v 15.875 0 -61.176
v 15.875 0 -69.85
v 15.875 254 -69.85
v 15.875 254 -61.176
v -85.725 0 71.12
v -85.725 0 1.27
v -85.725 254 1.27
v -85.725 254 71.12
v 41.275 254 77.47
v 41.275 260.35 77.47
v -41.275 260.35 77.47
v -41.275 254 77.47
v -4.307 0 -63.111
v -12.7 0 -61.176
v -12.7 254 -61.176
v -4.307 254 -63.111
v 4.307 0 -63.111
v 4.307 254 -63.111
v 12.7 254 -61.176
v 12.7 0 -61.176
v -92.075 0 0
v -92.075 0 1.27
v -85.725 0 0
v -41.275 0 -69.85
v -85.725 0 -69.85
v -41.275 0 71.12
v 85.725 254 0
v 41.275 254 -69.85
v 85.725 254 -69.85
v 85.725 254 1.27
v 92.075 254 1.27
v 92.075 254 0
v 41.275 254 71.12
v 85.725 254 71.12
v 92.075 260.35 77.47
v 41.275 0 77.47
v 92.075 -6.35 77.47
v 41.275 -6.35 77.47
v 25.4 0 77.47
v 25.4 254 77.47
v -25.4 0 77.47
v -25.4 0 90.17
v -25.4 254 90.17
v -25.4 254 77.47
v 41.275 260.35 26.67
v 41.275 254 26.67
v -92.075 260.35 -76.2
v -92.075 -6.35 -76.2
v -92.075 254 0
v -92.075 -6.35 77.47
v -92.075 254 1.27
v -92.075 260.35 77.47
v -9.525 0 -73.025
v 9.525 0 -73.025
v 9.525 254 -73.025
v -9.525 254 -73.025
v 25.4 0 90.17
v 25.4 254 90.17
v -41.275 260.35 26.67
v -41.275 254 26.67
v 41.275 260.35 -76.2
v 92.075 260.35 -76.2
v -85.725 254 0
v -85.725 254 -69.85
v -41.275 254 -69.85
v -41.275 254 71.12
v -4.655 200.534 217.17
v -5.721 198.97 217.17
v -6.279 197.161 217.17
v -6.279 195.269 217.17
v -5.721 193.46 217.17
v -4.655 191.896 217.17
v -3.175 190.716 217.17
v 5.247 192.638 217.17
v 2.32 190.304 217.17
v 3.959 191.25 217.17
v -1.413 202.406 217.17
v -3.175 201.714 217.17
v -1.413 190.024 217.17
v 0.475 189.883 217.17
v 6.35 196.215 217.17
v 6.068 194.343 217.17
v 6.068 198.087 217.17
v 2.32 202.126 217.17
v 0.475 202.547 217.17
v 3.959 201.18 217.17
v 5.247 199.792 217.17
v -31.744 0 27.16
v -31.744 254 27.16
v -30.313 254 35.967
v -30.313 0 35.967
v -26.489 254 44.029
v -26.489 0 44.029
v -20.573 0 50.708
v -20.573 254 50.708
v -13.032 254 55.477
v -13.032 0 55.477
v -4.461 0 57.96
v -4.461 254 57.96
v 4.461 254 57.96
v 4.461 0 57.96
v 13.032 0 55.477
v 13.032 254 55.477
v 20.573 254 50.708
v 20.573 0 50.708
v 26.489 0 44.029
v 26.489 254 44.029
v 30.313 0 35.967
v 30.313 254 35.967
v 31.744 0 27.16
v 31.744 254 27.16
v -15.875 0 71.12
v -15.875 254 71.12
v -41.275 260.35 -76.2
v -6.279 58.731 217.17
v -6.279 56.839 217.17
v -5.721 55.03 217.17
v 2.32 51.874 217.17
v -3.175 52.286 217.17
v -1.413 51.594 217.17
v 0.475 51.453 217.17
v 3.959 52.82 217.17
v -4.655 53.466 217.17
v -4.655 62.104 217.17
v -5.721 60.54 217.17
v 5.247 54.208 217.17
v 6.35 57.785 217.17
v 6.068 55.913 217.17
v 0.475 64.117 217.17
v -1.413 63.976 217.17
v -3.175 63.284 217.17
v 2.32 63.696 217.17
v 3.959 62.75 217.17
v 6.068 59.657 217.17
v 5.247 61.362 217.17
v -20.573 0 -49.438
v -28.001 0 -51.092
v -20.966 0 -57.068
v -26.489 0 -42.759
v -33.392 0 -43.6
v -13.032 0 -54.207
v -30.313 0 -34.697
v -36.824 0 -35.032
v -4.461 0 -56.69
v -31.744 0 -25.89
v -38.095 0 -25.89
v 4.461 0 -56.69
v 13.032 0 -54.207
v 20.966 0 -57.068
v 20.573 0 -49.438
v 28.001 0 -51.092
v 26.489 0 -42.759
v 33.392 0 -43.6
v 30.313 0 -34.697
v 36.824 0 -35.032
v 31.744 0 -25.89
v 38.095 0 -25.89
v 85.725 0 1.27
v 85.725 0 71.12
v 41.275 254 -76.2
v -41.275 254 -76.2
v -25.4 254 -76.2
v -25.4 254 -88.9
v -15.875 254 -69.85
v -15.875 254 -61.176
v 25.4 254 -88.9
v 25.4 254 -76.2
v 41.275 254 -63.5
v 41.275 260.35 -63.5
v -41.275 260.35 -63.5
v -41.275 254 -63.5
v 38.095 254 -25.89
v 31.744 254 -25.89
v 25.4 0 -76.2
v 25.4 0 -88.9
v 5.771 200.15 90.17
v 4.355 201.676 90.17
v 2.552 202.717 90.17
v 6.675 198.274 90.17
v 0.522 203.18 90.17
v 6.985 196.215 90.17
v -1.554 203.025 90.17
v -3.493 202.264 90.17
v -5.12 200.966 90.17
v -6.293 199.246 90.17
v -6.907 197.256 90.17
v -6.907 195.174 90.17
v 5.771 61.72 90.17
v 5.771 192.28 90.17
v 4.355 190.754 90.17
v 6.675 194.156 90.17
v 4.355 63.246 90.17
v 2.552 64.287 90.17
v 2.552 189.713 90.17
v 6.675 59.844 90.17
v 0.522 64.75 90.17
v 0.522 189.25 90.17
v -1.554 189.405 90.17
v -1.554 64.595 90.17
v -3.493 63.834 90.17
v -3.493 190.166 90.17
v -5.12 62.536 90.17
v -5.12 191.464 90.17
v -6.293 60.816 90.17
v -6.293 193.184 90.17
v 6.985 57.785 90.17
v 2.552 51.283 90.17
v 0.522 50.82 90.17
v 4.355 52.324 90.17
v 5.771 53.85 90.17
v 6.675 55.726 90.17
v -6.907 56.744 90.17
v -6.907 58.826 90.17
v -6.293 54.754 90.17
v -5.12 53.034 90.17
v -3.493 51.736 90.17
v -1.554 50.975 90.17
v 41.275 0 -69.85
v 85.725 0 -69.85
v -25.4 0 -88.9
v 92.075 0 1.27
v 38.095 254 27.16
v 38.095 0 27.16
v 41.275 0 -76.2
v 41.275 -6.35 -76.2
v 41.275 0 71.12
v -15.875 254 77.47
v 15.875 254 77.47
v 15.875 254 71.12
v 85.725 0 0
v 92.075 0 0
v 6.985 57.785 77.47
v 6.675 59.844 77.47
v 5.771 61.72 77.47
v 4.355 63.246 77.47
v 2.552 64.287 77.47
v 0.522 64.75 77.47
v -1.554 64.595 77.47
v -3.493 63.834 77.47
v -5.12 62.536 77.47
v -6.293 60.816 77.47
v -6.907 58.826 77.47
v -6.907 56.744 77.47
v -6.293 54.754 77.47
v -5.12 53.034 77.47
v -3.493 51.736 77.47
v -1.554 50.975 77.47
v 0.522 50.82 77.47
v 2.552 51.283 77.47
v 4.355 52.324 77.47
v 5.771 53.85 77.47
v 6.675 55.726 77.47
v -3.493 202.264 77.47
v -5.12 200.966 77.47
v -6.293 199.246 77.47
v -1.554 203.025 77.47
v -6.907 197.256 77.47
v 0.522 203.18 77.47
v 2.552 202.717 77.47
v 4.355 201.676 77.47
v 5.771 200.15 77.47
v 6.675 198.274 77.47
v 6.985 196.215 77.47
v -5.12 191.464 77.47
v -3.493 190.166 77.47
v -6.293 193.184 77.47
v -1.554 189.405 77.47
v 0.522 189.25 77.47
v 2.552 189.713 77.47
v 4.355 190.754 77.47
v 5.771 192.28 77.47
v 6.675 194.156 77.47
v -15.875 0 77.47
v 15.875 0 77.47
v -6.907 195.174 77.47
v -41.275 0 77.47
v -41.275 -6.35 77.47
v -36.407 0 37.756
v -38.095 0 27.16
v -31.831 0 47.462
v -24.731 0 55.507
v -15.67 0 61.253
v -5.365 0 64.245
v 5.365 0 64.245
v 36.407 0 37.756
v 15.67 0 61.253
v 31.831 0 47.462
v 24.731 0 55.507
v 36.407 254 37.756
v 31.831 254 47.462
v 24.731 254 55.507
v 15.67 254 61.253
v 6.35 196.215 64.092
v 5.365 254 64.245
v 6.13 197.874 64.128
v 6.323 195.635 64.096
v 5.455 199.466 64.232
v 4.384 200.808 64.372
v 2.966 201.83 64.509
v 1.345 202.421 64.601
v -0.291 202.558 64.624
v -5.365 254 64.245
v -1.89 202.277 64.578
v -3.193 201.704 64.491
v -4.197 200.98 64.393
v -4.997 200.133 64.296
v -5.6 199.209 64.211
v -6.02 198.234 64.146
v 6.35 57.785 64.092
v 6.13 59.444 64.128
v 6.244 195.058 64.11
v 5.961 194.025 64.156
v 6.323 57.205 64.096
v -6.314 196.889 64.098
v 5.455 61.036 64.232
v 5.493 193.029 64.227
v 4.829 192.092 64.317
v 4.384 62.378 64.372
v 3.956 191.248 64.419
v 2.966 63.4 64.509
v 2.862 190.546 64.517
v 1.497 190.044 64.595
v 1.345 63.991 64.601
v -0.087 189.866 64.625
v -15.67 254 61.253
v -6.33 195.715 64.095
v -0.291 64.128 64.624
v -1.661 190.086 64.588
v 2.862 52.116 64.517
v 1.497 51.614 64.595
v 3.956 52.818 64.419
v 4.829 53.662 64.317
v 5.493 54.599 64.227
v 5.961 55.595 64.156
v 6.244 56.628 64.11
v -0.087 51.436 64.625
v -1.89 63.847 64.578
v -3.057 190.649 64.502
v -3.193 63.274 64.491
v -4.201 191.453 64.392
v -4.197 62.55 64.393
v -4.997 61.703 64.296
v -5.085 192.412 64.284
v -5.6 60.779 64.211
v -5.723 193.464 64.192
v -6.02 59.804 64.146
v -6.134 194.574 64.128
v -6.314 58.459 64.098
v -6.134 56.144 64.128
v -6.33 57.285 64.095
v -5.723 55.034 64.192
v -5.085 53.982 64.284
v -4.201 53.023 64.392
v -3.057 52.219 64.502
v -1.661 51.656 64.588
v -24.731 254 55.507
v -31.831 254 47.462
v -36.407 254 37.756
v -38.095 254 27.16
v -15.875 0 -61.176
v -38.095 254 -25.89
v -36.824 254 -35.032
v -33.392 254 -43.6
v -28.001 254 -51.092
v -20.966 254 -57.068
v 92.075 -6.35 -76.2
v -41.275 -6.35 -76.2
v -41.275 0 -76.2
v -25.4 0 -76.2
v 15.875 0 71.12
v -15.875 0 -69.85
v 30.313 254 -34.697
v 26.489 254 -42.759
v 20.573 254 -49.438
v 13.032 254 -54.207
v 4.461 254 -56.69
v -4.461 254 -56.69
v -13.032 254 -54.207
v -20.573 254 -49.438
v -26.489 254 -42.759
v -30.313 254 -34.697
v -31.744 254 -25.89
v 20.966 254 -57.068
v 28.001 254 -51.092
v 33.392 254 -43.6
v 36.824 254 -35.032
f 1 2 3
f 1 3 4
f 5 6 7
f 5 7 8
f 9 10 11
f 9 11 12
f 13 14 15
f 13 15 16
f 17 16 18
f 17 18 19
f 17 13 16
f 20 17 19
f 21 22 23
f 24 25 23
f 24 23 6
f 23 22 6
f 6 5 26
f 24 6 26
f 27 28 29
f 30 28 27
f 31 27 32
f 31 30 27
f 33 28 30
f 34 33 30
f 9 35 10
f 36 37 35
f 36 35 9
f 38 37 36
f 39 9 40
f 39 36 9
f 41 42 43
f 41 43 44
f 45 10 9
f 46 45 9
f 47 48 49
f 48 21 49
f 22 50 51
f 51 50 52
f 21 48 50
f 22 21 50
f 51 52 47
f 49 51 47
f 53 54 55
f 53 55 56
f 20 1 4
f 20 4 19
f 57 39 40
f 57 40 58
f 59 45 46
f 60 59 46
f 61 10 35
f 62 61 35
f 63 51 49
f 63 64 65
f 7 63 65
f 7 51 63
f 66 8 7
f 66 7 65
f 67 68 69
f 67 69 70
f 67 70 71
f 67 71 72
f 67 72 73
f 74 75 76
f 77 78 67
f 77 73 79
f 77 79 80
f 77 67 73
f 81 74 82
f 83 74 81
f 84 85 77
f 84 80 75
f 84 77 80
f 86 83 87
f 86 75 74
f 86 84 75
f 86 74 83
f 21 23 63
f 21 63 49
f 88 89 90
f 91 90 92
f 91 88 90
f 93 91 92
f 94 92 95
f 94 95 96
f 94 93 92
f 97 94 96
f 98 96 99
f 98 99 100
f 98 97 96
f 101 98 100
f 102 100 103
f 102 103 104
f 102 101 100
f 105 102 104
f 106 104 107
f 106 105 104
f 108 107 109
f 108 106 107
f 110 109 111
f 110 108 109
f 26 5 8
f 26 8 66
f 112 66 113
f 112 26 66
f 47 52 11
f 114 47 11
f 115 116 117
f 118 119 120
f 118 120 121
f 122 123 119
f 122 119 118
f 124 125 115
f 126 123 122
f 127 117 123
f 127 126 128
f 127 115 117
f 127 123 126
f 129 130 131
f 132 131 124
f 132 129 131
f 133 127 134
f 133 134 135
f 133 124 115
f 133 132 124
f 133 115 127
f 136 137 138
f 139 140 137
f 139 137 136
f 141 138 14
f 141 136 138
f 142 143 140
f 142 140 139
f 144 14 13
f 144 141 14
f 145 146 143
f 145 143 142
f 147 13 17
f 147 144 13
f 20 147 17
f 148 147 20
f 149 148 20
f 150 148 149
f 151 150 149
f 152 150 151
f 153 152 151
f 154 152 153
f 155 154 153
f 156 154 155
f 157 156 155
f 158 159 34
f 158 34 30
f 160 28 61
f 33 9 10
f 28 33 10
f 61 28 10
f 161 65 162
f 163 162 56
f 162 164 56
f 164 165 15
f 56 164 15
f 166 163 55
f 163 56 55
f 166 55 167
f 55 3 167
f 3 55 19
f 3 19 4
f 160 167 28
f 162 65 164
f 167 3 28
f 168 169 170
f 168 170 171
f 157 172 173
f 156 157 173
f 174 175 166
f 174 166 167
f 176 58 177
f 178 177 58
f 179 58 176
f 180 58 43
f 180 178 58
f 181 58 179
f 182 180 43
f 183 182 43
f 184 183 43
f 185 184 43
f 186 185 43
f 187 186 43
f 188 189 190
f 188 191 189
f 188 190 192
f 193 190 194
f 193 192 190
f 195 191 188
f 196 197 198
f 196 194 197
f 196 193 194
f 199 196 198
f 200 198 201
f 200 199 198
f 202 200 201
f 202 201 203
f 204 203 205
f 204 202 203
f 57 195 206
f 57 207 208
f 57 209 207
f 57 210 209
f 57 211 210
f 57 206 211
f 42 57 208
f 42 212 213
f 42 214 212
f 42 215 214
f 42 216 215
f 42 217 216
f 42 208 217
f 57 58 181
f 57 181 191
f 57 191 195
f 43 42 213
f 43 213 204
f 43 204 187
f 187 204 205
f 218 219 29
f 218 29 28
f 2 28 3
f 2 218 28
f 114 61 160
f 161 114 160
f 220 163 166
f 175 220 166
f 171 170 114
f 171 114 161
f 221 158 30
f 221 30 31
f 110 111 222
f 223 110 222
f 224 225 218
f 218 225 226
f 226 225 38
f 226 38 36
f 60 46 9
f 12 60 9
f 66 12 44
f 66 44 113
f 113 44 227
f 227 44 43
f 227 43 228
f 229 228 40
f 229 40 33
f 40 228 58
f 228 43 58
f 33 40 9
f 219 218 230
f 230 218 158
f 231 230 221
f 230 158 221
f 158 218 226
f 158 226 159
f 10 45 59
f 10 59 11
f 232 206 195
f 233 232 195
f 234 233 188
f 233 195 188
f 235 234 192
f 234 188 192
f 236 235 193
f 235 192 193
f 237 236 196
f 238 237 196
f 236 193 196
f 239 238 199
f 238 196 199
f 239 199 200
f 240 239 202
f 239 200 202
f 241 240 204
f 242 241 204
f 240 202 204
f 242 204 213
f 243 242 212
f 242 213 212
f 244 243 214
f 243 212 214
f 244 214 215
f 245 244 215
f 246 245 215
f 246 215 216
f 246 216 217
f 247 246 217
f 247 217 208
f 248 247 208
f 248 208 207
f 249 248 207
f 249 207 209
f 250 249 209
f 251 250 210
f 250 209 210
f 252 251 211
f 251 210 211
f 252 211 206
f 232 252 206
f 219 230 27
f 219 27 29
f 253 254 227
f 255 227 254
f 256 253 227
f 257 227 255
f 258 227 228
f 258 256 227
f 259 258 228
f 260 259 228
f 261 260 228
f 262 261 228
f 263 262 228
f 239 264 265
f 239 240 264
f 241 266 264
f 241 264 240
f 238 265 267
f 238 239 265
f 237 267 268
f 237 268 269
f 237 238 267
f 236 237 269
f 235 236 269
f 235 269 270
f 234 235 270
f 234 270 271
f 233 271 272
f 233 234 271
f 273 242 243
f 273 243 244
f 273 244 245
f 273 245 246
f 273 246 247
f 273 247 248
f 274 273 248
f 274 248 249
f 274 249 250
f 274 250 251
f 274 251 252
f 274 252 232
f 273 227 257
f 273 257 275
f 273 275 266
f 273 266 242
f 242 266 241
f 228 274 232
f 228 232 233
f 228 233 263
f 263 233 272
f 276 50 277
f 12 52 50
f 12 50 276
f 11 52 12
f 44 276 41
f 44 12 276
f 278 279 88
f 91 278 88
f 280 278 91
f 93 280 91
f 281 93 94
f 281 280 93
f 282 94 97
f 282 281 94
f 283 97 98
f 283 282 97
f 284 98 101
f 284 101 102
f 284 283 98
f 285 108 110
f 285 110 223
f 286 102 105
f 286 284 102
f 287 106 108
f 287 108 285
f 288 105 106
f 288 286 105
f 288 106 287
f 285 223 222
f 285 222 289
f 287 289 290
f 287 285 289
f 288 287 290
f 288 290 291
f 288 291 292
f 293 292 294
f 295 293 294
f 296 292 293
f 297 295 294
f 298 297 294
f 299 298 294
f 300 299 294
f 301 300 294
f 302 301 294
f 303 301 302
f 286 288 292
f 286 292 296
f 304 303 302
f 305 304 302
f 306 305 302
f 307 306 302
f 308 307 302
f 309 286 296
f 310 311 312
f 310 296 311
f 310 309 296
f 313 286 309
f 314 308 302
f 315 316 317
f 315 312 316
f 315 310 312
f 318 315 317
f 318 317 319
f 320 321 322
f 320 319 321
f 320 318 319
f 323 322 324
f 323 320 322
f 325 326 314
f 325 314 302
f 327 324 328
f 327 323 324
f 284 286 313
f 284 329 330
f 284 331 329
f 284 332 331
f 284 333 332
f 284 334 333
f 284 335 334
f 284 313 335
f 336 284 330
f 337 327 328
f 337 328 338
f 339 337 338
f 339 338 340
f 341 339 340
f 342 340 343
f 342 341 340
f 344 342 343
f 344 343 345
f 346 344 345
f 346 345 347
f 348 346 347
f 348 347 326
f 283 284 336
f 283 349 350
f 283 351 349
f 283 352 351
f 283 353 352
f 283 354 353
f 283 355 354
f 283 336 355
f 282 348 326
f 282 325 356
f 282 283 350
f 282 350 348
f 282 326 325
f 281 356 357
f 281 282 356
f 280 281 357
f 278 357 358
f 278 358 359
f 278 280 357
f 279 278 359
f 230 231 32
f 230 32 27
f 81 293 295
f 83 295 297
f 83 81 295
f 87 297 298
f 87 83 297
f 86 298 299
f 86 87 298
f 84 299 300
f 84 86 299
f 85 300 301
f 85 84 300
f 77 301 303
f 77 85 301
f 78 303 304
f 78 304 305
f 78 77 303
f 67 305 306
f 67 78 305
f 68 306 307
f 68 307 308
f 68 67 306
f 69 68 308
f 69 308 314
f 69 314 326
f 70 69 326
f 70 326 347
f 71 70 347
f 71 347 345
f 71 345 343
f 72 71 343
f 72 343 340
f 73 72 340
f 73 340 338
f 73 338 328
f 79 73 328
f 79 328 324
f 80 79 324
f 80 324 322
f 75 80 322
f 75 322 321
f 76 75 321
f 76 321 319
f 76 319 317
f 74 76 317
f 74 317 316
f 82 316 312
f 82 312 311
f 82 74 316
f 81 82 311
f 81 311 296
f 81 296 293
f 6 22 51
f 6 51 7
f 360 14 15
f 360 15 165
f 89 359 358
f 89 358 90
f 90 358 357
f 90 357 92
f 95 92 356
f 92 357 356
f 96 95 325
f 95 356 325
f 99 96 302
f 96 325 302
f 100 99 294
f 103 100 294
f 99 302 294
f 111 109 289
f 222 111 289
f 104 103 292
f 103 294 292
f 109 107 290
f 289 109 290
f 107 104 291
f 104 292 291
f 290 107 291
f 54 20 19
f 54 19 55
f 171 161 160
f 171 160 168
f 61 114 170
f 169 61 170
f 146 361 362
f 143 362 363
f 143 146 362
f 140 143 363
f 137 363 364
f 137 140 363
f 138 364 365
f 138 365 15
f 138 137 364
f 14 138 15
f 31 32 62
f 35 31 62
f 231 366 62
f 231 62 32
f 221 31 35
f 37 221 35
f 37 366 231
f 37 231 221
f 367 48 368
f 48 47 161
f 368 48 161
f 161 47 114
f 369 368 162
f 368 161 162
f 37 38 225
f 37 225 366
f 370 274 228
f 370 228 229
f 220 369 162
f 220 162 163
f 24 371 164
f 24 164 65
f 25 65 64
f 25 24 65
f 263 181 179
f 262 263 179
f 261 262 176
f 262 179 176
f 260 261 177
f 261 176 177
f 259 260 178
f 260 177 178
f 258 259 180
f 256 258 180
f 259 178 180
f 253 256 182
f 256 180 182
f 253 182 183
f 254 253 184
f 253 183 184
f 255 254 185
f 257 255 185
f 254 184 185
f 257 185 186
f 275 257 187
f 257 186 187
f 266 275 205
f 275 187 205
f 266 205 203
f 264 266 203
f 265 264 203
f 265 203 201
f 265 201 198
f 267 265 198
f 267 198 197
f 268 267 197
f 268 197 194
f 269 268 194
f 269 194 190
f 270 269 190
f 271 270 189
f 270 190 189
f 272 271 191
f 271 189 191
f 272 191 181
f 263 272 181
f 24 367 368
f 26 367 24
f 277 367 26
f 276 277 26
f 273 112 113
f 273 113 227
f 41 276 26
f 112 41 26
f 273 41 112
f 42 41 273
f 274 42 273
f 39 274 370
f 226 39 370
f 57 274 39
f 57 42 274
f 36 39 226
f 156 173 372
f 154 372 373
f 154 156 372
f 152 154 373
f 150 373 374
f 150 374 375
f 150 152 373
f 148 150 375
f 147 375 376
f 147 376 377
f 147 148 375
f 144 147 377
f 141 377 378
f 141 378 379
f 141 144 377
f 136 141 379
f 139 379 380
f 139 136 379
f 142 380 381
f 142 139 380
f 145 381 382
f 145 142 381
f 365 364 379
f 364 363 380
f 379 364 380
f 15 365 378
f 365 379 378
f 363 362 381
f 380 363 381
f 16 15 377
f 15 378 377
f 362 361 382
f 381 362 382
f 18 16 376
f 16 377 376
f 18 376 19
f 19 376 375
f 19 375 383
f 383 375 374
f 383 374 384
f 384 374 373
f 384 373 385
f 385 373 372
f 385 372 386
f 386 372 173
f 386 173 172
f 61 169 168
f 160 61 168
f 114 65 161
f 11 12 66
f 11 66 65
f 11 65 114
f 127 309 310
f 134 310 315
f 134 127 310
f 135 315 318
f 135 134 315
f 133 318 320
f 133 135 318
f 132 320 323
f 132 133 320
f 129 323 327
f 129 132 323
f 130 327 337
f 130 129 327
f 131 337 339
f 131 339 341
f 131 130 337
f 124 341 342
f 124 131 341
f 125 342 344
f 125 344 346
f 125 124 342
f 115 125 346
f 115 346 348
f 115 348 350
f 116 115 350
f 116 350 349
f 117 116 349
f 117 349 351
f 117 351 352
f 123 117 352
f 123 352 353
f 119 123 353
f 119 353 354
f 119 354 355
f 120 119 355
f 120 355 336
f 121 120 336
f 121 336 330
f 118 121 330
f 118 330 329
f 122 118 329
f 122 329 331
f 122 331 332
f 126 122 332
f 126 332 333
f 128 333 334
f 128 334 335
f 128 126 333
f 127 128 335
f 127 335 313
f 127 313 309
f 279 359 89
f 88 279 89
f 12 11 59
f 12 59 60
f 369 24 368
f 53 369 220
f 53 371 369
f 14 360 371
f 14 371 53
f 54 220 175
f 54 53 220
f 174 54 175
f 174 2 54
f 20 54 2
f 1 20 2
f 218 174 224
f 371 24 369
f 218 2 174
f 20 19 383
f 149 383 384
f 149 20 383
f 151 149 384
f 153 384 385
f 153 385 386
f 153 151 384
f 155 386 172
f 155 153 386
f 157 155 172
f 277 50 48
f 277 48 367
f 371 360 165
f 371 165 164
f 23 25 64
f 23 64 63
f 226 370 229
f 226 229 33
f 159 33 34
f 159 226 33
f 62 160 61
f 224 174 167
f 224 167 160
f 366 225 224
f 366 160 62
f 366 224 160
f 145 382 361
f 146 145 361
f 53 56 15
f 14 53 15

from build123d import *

# Parameters (mm, degrees)
F2_DEPTH  = 254
F4_DEPTH  = 254
F5_R      = 6.985
F6_DEPTH  = 12.7
F8_R      = 6.35
F10_W     = 50.8
F10_H     = 6.35
F11_DEPTH = 153.67
F12_W     = 6.35
F12_H     = 12.7
F13_DEPTH = 82.55
F12_H_2   = 50.8


with BuildPart() as f2:
    # F1 (on Front) → F2 (new body)
    with BuildSketch(Plane.XZ):
        Polygon((-85.725, 0), (-92.075, 0), (-92.075, -76.2), (-25.4, -76.2), (-15.875, -76.2), (-15.875, -69.85), (-85.725, -69.85), align=None)
        Polygon((-15.875, -76.2), (-25.4, -76.2), (-25.4, -88.9), (25.4, -88.9), (25.4, -76.2), (15.875, -76.2), align=None)
        Polygon((-15.875, -69.85), (-15.875, -76.2), (15.875, -76.2), (15.875, -69.85), (15.875, -61.175738686), (12.7, -61.175738686), (9.525, -73.025), (-9.525, -73.025), (-12.7, -61.175738686), (-15.875, -61.175738686), align=None)
        Polygon((15.875, -69.85), (15.875, -76.2), (25.4, -76.2), (92.075, -76.2), (92.075, 0), (85.725, 0), (85.725, -69.85), align=None)
    extrude(amount=-F2_DEPTH)

    # F3 (on Front) → F4 (join)
    with BuildSketch(Plane.XZ):
        with BuildLine():
            ThreePointArc((31.7436493649, -25.8897142017), (0, -57.0047142017), (-31.7436493649, -25.8897142017))
            Line((-31.7436493649, -25.8897142017), (-38.0947079658, -25.8897142017))
            ThreePointArc((-38.0947079658, -25.8897142017), (0, -63.3547142017), (38.0947079658, -25.8897142017))
            Line((38.0947079658, -25.8897142017), (31.7436493649, -25.8897142017))
        make_face()
    extrude(amount=-F4_DEPTH)



with BuildPart() as f2b:
    # F1 (on Front) → F2, piece 2 (new body)
    with BuildSketch(Plane.XZ):
        Polygon((-92.075, 1.27), (-85.725, 1.27), (-85.725, 71.12), (-15.875, 71.12), (-15.875, 77.47), (-25.4, 77.47), (-92.075, 77.47), align=None)
        Polygon((-25.4, 90.17), (-25.4, 77.47), (-15.875, 77.47), (15.875, 77.47), (25.4, 77.47), (25.4, 90.17), align=None)
        Polygon((25.4, 77.47), (15.875, 77.47), (15.875, 71.12), (85.725, 71.12), (85.725, 1.27), (92.075, 1.27), (92.075, 77.47), align=None)
    extrude(amount=-F2_DEPTH)

    # F5 (on face) → F6 (cut, through all)
    with BuildSketch(Plane.XY.offset(90.17)):
        with Locations((0, 196.215)):
            Circle(F5_R)
        with Locations((0, 57.785)):
            Circle(F5_R)
    extrude(amount=-F6_DEPTH, mode=Mode.SUBTRACT)


with BuildPart() as f4:
    # F3 (on Front) → F4, piece 2 (new body)
    with BuildSketch(Plane.XZ):
        with BuildLine():
            ThreePointArc((38.0947079658, 27.1597142017), (0, 64.6247142017), (-38.0947079658, 27.1597142017))
            Line((-38.0947079658, 27.1597142017), (-31.7436493649, 27.1597142017))
            ThreePointArc((-31.7436493649, 27.1597142017), (0, 58.2747142017), (31.7436493649, 27.1597142017))
            Line((31.7436493649, 27.1597142017), (38.0947079658, 27.1597142017))
        make_face()
    extrude(amount=-F4_DEPTH)

    # F8 (on offset) → F9 (join, up to the next surface of F4)
    with BuildSketch(Plane.XY.offset(217.17)):
        with Locations((0, 196.215)):
            Circle(F8_R)
        with Locations((0, 57.785)):
            Circle(F8_R)
    extrude(until=Until.NEXT, dir=(0, 0, -1))


with BuildPart() as f2_1:
    add(f2.part)

    add(f2b.part)  # F11 merges F2b
    # F10 (on face) → F11 (join, through all)
    with BuildSketch(Plane.XY.offset(77.47)):
        with Locations((-66.675, -3.175)):
            Rectangle(F10_W, F10_H)
        with Locations((66.675, -3.175)):
            Rectangle(F10_W, F10_H)
        with Locations((-66.675, 257.175)):
            Rectangle(F10_W, F10_H)
        with Locations((66.675, 257.175)):
            Rectangle(F10_W, F10_H)
    extrude(amount=-F11_DEPTH)


with BuildPart() as f13:
    # F12 (on face) → F13 (new body, through all)
    with BuildSketch(Plane(origin=(41.275, 0, 0), x_dir=(0, -1, 0), z_dir=(-1, 0, 0))):
        with Locations((-257.175, -69.85)):
            Rectangle(F12_W, F12_H)
    extrude(amount=F13_DEPTH)


with BuildPart() as f13b:
    # F12 (on face) → F13, piece 2 (new body, through all)
    with BuildSketch(Plane(origin=(41.275, 0, 0), x_dir=(0, -1, 0), z_dir=(-1, 0, 0))):
        with Locations((-257.175, 52.07)):
            Rectangle(F12_W, F12_H_2)
    extrude(amount=F13_DEPTH)


solid = Compound([f4.part, f2_1.part, f13.part, f13b.part])
